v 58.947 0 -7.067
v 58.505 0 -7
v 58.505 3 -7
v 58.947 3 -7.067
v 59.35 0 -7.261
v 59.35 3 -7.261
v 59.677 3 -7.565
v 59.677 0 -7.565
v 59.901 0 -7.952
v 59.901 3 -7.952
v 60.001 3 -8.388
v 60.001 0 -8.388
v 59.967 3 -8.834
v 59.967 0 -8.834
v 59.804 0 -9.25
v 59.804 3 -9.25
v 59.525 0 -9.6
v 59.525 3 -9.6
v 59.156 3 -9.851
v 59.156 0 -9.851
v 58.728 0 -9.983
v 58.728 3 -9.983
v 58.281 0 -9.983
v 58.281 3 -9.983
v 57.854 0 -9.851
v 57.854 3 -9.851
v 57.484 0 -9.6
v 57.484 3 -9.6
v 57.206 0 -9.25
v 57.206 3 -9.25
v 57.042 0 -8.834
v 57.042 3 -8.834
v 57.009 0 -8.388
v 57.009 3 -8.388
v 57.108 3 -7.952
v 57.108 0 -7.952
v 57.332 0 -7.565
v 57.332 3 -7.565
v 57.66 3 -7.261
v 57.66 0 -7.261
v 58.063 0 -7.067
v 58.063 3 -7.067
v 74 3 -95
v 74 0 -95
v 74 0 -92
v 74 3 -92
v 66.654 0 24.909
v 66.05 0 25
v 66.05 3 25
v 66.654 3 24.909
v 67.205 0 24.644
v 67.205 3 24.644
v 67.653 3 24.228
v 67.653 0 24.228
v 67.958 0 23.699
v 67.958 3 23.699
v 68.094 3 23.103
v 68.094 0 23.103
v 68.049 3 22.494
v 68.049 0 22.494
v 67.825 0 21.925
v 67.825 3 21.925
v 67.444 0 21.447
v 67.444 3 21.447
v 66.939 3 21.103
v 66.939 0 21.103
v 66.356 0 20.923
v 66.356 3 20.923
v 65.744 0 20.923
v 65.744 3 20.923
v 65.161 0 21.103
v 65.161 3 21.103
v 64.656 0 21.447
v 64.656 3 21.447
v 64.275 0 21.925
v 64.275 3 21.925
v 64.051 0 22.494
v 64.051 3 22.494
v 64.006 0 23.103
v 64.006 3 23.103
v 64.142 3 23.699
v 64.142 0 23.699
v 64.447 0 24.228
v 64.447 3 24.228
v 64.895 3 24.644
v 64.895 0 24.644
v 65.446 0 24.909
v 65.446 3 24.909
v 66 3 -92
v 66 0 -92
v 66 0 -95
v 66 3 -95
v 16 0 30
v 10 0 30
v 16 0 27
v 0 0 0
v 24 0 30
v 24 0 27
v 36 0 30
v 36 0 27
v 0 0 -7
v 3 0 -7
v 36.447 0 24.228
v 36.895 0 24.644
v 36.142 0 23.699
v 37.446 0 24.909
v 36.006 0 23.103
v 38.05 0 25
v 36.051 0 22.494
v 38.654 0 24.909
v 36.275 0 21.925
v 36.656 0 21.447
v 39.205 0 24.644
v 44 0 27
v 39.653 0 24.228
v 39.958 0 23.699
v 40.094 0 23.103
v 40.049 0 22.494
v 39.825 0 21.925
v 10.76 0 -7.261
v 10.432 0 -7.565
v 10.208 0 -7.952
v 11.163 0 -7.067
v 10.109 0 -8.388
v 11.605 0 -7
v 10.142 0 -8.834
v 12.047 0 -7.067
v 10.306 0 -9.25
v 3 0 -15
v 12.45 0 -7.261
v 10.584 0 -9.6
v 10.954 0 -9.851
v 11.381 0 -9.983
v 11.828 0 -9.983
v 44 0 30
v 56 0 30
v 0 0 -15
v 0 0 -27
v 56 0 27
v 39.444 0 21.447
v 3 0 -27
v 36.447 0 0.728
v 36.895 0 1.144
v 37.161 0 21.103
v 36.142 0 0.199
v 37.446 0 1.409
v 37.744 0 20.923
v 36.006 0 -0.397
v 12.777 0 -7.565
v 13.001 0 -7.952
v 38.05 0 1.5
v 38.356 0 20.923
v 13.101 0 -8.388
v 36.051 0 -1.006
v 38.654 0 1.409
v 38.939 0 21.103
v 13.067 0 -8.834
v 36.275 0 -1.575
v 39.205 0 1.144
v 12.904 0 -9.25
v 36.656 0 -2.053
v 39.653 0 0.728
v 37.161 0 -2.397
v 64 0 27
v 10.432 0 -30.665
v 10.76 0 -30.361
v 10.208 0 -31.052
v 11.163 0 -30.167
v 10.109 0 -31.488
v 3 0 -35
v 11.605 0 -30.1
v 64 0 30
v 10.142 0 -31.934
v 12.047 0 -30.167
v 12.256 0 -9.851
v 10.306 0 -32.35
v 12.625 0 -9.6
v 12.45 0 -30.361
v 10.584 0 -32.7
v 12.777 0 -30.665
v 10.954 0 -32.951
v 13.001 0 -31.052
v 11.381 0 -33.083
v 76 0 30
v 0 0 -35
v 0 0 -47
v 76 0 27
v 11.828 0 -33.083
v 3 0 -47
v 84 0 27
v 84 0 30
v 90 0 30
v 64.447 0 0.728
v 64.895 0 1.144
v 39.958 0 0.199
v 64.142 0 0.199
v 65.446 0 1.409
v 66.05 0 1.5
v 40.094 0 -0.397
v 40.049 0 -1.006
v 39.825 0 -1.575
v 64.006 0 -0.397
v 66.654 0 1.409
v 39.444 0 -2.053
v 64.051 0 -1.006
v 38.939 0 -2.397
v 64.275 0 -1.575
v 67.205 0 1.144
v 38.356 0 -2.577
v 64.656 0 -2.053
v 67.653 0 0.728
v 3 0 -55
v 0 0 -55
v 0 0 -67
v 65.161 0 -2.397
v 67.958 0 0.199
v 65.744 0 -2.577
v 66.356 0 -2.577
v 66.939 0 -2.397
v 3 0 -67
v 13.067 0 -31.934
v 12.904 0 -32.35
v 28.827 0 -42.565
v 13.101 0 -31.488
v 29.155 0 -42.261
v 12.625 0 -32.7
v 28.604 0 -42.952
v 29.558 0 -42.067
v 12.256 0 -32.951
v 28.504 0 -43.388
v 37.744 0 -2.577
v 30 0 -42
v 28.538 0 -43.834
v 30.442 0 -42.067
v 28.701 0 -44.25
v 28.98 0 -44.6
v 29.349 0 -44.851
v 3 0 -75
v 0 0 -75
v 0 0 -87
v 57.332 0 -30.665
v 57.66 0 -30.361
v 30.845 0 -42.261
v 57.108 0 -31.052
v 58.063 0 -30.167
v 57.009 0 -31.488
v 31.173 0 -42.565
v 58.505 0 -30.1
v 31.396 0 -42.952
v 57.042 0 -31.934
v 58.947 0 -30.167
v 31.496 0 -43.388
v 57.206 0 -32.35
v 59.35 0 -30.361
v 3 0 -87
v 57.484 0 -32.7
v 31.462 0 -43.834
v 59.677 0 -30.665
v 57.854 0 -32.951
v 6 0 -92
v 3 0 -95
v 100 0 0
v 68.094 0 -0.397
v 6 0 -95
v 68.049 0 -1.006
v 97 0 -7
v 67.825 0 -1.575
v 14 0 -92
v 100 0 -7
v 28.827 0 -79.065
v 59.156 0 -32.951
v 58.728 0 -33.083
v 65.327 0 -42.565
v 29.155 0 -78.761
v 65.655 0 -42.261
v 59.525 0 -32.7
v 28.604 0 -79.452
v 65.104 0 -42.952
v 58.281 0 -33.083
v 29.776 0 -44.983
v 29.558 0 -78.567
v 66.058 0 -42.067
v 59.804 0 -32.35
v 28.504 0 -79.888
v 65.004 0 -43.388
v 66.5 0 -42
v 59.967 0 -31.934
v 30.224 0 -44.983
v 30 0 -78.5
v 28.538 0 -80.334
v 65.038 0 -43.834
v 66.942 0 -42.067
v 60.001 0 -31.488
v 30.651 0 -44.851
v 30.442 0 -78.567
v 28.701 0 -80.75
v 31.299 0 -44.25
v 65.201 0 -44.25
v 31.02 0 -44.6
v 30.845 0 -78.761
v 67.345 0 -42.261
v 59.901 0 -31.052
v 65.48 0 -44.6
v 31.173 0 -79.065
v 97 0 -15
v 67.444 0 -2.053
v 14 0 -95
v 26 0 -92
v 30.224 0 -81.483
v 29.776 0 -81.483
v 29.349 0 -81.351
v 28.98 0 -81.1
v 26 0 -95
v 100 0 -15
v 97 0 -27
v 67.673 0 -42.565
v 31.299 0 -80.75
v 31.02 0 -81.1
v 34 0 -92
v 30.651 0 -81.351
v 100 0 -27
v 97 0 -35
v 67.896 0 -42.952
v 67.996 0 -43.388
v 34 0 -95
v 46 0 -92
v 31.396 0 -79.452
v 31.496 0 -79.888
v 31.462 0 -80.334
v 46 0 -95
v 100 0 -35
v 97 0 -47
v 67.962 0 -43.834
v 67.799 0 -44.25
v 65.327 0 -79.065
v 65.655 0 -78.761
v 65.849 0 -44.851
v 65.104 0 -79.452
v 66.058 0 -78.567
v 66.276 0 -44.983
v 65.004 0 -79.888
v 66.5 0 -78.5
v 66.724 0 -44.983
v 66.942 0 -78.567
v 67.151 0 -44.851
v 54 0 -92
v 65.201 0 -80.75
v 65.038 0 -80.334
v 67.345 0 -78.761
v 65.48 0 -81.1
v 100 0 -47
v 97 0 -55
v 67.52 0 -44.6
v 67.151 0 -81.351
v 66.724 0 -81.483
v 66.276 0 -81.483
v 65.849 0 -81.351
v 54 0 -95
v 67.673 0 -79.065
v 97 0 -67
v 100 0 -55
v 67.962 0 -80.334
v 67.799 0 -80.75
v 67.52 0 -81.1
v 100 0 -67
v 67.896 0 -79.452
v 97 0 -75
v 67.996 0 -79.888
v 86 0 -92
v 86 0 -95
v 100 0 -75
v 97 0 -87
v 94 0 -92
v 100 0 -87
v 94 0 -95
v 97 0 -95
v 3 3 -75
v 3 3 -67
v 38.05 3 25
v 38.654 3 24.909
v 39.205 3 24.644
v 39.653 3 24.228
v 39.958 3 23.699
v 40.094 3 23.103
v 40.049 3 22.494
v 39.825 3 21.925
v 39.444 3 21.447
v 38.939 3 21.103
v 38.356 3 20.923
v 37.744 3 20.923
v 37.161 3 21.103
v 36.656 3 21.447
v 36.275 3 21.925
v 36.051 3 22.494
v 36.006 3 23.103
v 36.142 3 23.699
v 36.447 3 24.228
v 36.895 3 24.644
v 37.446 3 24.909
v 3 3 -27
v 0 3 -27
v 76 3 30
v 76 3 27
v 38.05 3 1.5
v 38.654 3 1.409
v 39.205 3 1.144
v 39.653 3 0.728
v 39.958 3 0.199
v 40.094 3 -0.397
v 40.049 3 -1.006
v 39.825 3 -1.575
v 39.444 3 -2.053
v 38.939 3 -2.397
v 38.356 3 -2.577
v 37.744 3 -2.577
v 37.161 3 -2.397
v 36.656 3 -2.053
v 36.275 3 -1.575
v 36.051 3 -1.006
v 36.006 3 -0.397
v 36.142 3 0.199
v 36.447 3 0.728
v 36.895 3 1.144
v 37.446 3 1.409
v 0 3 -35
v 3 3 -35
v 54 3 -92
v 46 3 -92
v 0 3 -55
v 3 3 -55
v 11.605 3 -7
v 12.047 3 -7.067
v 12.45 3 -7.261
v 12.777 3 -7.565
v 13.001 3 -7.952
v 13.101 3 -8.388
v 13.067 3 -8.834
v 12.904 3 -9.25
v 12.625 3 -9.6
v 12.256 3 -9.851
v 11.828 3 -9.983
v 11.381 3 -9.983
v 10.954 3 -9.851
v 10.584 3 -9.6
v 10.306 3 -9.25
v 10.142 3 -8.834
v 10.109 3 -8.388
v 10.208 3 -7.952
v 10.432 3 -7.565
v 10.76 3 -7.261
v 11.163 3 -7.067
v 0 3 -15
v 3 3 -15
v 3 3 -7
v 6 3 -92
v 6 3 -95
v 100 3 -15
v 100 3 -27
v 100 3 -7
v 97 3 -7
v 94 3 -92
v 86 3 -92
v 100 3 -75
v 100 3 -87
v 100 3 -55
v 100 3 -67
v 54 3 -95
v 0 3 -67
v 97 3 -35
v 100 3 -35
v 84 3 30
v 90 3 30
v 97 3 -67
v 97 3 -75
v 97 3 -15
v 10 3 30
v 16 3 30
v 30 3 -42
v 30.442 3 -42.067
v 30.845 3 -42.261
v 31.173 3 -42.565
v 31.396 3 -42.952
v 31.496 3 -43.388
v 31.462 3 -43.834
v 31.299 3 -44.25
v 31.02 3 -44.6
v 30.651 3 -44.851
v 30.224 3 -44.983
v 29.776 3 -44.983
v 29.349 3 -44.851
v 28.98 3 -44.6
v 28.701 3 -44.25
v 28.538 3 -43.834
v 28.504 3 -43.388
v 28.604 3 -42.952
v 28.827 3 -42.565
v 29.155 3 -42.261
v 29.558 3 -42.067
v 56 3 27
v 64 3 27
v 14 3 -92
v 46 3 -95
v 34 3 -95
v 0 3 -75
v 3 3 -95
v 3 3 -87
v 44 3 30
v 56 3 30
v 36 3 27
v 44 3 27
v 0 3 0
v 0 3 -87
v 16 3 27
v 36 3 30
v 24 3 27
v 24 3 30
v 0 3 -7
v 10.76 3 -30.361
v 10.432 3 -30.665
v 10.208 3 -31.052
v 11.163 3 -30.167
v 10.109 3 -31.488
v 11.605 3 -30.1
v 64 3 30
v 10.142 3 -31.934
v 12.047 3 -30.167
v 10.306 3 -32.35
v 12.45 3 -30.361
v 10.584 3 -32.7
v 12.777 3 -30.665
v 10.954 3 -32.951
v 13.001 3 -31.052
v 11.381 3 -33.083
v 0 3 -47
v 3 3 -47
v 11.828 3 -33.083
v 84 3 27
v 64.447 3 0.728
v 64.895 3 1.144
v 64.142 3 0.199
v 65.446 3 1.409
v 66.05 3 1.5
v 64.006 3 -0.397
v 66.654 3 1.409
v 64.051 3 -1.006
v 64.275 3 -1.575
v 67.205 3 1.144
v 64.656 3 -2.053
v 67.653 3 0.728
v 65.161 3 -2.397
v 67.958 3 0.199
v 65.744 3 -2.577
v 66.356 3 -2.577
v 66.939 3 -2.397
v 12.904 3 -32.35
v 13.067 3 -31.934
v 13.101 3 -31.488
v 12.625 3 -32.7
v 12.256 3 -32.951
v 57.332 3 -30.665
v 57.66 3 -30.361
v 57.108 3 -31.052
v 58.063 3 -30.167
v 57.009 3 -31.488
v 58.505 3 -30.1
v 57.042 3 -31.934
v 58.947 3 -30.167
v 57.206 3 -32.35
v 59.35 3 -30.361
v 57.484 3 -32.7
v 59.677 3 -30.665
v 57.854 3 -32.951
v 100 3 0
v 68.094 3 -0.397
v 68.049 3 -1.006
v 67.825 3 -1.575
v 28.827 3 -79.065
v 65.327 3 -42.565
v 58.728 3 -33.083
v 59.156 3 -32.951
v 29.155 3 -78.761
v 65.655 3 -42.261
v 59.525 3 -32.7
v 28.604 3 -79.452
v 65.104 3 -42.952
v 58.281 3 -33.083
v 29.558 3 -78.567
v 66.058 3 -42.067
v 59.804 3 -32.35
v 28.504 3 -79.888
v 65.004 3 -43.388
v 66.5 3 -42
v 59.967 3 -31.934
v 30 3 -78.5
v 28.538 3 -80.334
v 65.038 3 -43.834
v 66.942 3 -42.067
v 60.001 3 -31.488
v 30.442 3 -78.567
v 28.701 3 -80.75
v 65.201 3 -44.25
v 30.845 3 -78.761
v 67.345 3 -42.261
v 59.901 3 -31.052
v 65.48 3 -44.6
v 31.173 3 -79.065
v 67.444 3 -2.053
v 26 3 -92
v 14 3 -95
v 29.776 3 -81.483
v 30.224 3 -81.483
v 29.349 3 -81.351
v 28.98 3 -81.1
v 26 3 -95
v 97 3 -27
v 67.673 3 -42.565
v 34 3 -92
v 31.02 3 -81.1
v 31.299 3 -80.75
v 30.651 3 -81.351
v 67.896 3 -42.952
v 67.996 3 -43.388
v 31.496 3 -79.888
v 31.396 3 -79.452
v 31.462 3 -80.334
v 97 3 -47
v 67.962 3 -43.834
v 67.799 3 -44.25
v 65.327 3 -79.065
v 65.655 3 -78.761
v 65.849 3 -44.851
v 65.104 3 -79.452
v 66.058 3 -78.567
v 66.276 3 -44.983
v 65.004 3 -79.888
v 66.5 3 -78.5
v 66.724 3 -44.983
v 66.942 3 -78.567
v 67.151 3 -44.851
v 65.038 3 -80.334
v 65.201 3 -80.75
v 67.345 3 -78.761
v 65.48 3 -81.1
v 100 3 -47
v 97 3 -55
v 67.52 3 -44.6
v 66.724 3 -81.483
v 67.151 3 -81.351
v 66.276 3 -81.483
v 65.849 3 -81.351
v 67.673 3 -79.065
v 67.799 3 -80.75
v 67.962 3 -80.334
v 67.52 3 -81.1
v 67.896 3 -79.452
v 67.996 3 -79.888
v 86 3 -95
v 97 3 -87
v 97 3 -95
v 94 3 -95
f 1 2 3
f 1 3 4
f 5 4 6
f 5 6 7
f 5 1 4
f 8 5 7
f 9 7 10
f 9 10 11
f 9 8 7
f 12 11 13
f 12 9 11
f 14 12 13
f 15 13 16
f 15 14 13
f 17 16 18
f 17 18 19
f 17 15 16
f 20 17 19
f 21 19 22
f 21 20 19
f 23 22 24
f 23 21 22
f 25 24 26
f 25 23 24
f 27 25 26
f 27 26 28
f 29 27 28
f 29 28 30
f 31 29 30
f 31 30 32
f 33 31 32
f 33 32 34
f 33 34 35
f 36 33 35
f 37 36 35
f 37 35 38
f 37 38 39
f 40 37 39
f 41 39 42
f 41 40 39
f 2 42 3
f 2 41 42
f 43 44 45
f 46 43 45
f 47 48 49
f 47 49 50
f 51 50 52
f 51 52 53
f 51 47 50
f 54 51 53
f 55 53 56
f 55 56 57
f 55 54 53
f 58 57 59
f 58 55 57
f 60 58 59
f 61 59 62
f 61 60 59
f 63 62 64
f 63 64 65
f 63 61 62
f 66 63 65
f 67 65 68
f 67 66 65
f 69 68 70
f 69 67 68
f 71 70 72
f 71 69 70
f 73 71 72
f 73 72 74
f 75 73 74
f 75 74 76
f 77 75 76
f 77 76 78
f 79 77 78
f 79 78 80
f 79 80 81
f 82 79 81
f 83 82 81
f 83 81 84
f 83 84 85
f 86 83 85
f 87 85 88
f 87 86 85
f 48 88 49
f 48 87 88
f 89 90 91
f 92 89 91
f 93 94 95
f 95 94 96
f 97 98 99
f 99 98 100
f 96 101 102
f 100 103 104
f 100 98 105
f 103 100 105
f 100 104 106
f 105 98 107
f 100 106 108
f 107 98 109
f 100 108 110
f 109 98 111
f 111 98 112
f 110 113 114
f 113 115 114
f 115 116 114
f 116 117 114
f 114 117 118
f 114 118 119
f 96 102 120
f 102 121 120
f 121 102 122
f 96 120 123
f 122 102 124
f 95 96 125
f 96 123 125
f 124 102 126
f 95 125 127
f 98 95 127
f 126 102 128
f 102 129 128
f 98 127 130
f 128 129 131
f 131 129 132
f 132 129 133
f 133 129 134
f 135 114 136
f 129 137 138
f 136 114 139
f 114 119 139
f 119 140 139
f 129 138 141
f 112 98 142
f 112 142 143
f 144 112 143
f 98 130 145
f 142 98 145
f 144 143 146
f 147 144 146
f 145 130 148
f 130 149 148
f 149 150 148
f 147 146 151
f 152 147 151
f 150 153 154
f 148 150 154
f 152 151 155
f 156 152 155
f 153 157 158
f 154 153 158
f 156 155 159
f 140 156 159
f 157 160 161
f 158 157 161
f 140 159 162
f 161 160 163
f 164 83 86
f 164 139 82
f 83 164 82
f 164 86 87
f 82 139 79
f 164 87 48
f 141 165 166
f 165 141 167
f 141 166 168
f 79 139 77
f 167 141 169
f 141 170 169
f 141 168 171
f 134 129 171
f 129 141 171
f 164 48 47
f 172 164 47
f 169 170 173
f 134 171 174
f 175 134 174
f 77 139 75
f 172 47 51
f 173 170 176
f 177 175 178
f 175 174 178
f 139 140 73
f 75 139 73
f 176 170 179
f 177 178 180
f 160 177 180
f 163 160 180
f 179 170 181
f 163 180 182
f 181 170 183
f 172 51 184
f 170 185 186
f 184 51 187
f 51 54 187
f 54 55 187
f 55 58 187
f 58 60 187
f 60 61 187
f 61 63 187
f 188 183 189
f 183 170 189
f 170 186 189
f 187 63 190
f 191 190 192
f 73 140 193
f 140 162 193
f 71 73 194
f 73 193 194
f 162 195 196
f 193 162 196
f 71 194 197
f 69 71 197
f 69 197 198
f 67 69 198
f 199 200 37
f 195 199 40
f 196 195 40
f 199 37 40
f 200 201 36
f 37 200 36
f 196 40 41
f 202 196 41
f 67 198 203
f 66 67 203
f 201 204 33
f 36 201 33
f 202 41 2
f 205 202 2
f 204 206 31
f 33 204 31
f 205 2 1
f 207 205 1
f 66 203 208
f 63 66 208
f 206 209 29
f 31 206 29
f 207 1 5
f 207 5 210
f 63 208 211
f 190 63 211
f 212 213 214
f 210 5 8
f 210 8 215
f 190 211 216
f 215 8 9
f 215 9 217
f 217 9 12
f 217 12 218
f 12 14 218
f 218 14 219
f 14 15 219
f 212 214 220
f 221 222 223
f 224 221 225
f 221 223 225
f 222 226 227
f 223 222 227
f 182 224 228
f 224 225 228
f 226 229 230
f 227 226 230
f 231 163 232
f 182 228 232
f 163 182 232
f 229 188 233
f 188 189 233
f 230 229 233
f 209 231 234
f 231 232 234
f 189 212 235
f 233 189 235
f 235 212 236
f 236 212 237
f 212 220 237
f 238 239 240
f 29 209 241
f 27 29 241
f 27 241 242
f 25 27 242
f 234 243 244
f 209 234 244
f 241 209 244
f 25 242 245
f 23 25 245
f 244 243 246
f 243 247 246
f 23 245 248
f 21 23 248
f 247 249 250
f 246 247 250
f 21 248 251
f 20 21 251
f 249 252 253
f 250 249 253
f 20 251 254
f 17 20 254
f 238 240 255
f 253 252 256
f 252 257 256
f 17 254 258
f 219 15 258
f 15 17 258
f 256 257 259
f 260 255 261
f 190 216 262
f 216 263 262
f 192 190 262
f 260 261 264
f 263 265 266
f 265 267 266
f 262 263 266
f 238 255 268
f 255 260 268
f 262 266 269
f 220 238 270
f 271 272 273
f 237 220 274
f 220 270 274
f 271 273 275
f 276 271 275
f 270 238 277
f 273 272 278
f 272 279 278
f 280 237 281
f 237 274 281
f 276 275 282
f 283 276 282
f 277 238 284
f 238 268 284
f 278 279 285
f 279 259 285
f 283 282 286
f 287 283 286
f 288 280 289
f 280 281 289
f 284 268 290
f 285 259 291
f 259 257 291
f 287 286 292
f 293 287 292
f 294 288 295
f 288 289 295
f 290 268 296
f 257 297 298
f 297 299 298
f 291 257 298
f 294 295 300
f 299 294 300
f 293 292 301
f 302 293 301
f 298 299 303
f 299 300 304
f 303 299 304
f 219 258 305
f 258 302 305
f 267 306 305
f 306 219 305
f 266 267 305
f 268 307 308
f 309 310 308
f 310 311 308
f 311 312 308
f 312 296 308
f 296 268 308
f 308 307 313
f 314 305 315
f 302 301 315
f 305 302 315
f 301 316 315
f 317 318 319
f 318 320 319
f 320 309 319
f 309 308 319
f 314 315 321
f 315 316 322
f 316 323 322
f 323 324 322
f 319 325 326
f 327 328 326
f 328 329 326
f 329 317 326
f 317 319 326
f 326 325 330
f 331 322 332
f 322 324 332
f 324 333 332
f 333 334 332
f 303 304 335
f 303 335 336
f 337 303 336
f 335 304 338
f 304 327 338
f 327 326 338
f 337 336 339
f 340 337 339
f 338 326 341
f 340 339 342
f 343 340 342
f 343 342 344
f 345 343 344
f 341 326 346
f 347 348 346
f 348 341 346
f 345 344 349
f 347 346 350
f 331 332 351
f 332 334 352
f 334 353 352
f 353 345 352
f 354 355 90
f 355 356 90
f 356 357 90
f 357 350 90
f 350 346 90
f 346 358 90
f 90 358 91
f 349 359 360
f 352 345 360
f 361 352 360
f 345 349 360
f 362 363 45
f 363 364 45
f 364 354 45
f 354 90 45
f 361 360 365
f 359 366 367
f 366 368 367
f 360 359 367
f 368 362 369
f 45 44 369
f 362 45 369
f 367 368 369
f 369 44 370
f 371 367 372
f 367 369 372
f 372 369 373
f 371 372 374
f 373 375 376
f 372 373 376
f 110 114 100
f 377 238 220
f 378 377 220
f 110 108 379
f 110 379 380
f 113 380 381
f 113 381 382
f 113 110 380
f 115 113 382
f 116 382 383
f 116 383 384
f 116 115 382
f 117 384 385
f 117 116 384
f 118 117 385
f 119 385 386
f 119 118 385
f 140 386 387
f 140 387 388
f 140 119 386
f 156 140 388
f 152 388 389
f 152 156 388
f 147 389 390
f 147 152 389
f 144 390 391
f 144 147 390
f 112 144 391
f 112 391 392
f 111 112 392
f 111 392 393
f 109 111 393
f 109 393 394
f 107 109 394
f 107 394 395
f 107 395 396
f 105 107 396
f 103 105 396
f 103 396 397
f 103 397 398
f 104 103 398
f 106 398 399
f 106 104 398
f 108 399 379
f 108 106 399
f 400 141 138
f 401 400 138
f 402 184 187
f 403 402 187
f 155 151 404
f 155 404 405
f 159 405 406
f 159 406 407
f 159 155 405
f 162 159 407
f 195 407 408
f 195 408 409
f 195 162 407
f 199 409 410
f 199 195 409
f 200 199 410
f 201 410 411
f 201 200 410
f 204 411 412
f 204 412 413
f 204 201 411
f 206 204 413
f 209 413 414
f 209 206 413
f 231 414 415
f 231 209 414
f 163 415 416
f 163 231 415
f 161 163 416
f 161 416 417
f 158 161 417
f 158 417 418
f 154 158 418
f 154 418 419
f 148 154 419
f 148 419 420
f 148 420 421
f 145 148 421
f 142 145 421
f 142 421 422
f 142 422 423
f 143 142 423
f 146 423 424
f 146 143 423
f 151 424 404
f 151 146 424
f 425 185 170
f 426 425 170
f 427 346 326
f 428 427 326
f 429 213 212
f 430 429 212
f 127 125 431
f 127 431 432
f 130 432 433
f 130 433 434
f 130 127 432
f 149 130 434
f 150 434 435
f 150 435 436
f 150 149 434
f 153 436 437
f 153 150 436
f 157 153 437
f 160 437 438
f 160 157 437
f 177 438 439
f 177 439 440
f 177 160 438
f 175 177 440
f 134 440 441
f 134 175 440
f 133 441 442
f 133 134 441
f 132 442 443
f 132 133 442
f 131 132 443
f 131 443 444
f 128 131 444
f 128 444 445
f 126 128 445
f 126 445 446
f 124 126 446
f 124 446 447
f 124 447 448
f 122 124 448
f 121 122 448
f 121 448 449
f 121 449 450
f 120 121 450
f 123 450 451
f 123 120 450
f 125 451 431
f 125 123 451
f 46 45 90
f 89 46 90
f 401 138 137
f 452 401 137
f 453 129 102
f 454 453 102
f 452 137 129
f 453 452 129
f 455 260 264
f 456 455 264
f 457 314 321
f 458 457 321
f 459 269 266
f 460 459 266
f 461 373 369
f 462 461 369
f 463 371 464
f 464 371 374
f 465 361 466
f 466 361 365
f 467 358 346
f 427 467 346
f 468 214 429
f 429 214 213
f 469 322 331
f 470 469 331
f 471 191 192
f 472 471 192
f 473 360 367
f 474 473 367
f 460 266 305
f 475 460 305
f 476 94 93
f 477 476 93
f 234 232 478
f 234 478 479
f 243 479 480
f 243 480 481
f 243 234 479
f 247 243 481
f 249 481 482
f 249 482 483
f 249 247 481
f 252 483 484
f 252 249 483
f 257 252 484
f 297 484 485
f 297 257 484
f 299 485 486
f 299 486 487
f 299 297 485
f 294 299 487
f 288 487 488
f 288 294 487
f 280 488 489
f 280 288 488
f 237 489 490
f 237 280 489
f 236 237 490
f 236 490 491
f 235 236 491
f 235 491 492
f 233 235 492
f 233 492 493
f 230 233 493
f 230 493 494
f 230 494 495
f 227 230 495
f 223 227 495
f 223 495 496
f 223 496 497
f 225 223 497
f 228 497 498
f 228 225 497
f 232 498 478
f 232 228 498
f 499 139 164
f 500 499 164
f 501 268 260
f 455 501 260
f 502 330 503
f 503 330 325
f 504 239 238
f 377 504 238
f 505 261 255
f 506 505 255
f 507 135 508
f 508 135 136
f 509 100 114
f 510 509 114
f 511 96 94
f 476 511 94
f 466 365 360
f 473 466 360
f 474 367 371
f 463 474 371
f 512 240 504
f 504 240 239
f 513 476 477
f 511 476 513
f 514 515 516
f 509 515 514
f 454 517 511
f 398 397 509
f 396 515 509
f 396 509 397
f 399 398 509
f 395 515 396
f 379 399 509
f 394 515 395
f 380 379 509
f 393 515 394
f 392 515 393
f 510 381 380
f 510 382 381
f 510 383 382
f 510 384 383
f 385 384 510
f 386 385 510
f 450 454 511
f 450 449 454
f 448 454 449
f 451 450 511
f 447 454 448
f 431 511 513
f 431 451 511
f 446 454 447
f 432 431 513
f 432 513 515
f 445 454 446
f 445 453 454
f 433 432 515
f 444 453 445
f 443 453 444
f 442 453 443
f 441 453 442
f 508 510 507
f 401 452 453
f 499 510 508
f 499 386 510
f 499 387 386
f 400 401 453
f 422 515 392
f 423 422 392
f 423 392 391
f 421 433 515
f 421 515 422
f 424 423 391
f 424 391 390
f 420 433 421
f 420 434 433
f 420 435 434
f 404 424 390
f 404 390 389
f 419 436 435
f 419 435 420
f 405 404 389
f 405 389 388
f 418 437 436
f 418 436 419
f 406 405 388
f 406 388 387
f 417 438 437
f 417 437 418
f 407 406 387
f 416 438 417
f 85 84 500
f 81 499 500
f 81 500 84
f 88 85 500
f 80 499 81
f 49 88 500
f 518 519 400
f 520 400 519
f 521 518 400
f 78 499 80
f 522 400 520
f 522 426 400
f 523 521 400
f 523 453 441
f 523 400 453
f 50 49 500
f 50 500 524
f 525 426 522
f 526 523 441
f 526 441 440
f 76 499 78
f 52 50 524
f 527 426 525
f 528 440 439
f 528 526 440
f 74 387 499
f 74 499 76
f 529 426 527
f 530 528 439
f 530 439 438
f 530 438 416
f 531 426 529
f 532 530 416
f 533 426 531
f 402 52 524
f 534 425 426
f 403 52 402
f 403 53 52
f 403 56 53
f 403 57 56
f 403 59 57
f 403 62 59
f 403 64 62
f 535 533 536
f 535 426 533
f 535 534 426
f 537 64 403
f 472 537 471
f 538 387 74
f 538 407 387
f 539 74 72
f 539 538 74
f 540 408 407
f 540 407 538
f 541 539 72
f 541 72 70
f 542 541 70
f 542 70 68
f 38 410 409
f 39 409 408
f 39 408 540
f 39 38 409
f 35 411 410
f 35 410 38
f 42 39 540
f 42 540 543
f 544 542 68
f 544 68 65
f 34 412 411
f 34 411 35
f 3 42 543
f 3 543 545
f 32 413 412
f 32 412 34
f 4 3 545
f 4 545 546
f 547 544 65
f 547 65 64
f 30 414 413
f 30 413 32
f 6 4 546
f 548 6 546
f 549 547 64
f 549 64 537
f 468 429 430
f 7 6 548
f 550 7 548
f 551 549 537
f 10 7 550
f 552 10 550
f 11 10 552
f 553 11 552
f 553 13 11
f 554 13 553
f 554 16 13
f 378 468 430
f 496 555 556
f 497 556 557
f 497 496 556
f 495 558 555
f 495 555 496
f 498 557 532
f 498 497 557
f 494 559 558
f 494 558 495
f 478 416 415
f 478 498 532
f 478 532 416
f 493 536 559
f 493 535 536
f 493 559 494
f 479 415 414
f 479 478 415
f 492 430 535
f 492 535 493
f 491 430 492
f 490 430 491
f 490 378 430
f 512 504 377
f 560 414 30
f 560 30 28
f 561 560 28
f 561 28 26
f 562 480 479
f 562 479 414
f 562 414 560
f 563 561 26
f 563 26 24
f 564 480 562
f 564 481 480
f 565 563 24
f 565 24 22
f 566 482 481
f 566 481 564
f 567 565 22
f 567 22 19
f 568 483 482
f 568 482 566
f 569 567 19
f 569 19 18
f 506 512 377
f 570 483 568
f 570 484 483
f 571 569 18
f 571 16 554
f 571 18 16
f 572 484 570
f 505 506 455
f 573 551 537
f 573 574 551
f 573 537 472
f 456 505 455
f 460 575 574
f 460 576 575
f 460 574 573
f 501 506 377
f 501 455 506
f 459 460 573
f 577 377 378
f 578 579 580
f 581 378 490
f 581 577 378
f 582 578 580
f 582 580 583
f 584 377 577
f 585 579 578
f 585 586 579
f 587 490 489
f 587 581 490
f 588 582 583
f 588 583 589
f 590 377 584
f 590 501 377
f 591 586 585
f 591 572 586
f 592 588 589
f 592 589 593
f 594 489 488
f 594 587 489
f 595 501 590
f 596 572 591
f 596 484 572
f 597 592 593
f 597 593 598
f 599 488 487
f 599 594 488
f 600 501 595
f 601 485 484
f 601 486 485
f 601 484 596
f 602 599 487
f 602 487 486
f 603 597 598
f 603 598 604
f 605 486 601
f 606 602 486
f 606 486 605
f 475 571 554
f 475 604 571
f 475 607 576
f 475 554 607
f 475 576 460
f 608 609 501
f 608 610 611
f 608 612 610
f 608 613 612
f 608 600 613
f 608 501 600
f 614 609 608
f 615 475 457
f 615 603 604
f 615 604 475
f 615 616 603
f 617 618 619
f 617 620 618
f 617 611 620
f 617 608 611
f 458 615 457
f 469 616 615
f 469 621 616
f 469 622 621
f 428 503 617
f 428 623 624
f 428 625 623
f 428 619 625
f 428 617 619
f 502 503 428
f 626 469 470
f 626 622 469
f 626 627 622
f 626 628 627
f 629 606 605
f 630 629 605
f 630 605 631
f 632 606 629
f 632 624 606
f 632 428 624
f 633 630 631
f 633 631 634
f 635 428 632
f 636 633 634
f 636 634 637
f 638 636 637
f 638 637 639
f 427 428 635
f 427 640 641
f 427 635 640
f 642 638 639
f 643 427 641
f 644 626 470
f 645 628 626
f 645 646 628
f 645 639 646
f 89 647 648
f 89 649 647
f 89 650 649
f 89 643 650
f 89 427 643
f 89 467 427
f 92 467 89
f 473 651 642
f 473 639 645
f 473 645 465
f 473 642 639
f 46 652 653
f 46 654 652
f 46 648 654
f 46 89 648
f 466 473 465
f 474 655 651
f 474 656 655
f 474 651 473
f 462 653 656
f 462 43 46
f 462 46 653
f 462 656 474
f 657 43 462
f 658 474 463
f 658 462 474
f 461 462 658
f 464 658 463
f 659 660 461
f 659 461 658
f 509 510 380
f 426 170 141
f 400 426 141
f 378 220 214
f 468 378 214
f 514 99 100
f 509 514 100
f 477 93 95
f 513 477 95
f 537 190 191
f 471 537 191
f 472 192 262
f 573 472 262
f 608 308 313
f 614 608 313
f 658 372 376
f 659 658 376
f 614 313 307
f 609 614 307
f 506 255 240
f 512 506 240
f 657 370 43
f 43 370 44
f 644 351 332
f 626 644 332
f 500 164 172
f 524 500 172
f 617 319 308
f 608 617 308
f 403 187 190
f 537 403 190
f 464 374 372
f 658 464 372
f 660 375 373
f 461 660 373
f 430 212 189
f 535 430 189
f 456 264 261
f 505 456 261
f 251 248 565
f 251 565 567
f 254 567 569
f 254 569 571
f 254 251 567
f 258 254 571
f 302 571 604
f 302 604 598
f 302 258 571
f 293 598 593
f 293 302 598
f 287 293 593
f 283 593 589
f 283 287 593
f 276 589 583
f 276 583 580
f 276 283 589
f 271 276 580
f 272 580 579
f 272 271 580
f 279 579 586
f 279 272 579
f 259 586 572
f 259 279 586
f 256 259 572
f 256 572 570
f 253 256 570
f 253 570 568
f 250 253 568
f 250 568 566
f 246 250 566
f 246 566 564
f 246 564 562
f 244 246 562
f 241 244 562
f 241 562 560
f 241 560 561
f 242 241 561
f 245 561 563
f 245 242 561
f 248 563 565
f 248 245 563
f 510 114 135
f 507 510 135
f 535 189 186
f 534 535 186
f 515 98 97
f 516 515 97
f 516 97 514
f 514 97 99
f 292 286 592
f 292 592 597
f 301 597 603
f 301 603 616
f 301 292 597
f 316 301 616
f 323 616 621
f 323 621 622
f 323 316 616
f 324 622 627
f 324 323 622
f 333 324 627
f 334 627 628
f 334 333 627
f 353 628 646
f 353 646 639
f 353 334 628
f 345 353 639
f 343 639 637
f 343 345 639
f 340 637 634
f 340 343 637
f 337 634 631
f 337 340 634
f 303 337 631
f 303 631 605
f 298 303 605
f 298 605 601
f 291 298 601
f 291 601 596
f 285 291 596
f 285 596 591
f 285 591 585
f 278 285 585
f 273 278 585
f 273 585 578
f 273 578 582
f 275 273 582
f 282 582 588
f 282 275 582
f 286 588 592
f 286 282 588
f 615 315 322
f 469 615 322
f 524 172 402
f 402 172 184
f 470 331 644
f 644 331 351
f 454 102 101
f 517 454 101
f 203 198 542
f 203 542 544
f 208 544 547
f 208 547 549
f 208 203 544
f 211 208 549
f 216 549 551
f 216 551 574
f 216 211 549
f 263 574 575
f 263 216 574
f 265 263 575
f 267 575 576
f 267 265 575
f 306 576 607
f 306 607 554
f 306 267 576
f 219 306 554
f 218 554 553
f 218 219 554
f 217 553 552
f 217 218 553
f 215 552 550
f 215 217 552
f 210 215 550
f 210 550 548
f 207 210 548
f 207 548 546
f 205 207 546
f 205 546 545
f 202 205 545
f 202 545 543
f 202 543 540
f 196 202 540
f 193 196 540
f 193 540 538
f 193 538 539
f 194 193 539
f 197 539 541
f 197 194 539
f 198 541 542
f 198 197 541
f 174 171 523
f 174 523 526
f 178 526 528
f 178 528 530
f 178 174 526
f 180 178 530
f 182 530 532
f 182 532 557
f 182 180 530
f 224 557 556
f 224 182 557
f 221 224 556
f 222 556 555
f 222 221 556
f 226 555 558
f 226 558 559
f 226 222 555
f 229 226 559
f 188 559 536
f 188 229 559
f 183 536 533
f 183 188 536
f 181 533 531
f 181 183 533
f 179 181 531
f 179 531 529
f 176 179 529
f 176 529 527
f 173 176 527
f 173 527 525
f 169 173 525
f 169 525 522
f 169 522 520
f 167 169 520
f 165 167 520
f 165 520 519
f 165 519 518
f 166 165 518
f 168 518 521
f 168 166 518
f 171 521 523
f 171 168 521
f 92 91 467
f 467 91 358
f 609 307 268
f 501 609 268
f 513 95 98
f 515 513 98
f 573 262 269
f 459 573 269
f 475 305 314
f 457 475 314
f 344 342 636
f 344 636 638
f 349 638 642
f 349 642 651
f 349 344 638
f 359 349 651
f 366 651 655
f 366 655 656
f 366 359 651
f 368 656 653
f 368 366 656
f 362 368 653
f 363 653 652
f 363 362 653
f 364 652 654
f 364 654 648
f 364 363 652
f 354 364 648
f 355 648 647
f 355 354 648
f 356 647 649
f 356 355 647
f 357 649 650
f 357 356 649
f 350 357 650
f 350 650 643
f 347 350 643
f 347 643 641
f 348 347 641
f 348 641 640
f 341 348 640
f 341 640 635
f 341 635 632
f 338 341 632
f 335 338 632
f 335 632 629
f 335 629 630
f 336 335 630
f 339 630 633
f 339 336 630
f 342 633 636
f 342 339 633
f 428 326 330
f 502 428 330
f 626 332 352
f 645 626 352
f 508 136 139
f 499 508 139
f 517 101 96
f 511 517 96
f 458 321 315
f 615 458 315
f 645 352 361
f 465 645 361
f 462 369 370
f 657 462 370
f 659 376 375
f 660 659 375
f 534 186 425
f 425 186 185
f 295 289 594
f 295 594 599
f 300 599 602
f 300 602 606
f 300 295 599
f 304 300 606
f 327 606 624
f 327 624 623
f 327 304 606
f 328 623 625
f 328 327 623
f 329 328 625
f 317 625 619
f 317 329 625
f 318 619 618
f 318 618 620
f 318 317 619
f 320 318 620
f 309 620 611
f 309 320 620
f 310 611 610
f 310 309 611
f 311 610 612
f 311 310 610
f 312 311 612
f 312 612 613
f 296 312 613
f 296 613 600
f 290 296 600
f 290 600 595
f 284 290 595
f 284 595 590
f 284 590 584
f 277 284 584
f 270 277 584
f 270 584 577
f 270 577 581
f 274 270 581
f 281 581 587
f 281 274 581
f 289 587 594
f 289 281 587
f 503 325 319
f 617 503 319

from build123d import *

# Parameters (mm, degrees)
ESQUISSE1_R        = 2.05
ESQUISSE1_R_2      = 1.5
BOSS_EXTRU_1_DEPTH = 3


with BuildPart() as part:
    # Esquisse1 → Boss.-Extru.1 (new body)
    with BuildSketch(Plane(origin=(0, 0, 0), x_dir=(1, 0, 0), z_dir=(0, 1, 0))):
        Polygon((44, -30), (56, -30), (56, -27), (64, -27), (64, -30), (76, -30), (76, -27), (84, -27), (84, -30), (90, -30), (100, 0), (100, 7), (97, 7), (97, 15), (100, 15), (100, 27), (97, 27), (97, 35), (100, 35), (100, 47), (97, 47), (97, 55), (100, 55), (100, 67), (97, 67), (97, 75), (100, 75), (100, 87), (97, 87), (97, 95), (94, 95), (94, 92), (86, 92), (86, 95), (74, 95), (74, 92), (66, 92), (66, 95), (54, 95), (54, 92), (46, 92), (46, 95), (34, 95), (34, 92), (26, 92), (26, 95), (14, 95), (14, 92), (6, 92), (6, 95), (3, 95), (3, 87), (0, 87), (0, 75), (3, 75), (3, 67), (0, 67), (0, 55), (3, 55), (3, 47), (0, 47), (0, 35), (3, 35), (3, 27), (0, 27), (0, 15), (3, 15), (3, 7), (0, 7), (0, 0), (10, -30), (16, -30), (16, -27), (24, -27), (24, -30), (36, -30), (36, -27), (44, -27), align=None)
        with Locations((38.05, 0.55)):
            Circle(ESQUISSE1_R, mode=Mode.SUBTRACT)
        with Locations((38.05, -22.95)):
            Circle(ESQUISSE1_R, mode=Mode.SUBTRACT)
        with Locations((30, 43.5)):
            Circle(ESQUISSE1_R_2, mode=Mode.SUBTRACT)
        with Locations((30, 80)):
            Circle(ESQUISSE1_R_2, mode=Mode.SUBTRACT)
        with Locations((11.604719745, 8.5)):
            Circle(ESQUISSE1_R_2, mode=Mode.SUBTRACT)
        with Locations((11.604719745, 31.6)):
            Circle(ESQUISSE1_R_2, mode=Mode.SUBTRACT)
        with Locations((66.05, -22.95)):
            Circle(ESQUISSE1_R, mode=Mode.SUBTRACT)
        with Locations((66.05, 0.55)):
            Circle(ESQUISSE1_R, mode=Mode.SUBTRACT)
        with Locations((66.5, 80)):
            Circle(ESQUISSE1_R_2, mode=Mode.SUBTRACT)
        with Locations((58.504719745, 31.6)):
            Circle(ESQUISSE1_R_2, mode=Mode.SUBTRACT)
        with Locations((66.5, 43.5)):
            Circle(ESQUISSE1_R_2, mode=Mode.SUBTRACT)
        with Locations((58.504719745, 8.5)):
            Circle(ESQUISSE1_R_2, mode=Mode.SUBTRACT)
    extrude(amount=BOSS_EXTRU_1_DEPTH)


solid = part.part
